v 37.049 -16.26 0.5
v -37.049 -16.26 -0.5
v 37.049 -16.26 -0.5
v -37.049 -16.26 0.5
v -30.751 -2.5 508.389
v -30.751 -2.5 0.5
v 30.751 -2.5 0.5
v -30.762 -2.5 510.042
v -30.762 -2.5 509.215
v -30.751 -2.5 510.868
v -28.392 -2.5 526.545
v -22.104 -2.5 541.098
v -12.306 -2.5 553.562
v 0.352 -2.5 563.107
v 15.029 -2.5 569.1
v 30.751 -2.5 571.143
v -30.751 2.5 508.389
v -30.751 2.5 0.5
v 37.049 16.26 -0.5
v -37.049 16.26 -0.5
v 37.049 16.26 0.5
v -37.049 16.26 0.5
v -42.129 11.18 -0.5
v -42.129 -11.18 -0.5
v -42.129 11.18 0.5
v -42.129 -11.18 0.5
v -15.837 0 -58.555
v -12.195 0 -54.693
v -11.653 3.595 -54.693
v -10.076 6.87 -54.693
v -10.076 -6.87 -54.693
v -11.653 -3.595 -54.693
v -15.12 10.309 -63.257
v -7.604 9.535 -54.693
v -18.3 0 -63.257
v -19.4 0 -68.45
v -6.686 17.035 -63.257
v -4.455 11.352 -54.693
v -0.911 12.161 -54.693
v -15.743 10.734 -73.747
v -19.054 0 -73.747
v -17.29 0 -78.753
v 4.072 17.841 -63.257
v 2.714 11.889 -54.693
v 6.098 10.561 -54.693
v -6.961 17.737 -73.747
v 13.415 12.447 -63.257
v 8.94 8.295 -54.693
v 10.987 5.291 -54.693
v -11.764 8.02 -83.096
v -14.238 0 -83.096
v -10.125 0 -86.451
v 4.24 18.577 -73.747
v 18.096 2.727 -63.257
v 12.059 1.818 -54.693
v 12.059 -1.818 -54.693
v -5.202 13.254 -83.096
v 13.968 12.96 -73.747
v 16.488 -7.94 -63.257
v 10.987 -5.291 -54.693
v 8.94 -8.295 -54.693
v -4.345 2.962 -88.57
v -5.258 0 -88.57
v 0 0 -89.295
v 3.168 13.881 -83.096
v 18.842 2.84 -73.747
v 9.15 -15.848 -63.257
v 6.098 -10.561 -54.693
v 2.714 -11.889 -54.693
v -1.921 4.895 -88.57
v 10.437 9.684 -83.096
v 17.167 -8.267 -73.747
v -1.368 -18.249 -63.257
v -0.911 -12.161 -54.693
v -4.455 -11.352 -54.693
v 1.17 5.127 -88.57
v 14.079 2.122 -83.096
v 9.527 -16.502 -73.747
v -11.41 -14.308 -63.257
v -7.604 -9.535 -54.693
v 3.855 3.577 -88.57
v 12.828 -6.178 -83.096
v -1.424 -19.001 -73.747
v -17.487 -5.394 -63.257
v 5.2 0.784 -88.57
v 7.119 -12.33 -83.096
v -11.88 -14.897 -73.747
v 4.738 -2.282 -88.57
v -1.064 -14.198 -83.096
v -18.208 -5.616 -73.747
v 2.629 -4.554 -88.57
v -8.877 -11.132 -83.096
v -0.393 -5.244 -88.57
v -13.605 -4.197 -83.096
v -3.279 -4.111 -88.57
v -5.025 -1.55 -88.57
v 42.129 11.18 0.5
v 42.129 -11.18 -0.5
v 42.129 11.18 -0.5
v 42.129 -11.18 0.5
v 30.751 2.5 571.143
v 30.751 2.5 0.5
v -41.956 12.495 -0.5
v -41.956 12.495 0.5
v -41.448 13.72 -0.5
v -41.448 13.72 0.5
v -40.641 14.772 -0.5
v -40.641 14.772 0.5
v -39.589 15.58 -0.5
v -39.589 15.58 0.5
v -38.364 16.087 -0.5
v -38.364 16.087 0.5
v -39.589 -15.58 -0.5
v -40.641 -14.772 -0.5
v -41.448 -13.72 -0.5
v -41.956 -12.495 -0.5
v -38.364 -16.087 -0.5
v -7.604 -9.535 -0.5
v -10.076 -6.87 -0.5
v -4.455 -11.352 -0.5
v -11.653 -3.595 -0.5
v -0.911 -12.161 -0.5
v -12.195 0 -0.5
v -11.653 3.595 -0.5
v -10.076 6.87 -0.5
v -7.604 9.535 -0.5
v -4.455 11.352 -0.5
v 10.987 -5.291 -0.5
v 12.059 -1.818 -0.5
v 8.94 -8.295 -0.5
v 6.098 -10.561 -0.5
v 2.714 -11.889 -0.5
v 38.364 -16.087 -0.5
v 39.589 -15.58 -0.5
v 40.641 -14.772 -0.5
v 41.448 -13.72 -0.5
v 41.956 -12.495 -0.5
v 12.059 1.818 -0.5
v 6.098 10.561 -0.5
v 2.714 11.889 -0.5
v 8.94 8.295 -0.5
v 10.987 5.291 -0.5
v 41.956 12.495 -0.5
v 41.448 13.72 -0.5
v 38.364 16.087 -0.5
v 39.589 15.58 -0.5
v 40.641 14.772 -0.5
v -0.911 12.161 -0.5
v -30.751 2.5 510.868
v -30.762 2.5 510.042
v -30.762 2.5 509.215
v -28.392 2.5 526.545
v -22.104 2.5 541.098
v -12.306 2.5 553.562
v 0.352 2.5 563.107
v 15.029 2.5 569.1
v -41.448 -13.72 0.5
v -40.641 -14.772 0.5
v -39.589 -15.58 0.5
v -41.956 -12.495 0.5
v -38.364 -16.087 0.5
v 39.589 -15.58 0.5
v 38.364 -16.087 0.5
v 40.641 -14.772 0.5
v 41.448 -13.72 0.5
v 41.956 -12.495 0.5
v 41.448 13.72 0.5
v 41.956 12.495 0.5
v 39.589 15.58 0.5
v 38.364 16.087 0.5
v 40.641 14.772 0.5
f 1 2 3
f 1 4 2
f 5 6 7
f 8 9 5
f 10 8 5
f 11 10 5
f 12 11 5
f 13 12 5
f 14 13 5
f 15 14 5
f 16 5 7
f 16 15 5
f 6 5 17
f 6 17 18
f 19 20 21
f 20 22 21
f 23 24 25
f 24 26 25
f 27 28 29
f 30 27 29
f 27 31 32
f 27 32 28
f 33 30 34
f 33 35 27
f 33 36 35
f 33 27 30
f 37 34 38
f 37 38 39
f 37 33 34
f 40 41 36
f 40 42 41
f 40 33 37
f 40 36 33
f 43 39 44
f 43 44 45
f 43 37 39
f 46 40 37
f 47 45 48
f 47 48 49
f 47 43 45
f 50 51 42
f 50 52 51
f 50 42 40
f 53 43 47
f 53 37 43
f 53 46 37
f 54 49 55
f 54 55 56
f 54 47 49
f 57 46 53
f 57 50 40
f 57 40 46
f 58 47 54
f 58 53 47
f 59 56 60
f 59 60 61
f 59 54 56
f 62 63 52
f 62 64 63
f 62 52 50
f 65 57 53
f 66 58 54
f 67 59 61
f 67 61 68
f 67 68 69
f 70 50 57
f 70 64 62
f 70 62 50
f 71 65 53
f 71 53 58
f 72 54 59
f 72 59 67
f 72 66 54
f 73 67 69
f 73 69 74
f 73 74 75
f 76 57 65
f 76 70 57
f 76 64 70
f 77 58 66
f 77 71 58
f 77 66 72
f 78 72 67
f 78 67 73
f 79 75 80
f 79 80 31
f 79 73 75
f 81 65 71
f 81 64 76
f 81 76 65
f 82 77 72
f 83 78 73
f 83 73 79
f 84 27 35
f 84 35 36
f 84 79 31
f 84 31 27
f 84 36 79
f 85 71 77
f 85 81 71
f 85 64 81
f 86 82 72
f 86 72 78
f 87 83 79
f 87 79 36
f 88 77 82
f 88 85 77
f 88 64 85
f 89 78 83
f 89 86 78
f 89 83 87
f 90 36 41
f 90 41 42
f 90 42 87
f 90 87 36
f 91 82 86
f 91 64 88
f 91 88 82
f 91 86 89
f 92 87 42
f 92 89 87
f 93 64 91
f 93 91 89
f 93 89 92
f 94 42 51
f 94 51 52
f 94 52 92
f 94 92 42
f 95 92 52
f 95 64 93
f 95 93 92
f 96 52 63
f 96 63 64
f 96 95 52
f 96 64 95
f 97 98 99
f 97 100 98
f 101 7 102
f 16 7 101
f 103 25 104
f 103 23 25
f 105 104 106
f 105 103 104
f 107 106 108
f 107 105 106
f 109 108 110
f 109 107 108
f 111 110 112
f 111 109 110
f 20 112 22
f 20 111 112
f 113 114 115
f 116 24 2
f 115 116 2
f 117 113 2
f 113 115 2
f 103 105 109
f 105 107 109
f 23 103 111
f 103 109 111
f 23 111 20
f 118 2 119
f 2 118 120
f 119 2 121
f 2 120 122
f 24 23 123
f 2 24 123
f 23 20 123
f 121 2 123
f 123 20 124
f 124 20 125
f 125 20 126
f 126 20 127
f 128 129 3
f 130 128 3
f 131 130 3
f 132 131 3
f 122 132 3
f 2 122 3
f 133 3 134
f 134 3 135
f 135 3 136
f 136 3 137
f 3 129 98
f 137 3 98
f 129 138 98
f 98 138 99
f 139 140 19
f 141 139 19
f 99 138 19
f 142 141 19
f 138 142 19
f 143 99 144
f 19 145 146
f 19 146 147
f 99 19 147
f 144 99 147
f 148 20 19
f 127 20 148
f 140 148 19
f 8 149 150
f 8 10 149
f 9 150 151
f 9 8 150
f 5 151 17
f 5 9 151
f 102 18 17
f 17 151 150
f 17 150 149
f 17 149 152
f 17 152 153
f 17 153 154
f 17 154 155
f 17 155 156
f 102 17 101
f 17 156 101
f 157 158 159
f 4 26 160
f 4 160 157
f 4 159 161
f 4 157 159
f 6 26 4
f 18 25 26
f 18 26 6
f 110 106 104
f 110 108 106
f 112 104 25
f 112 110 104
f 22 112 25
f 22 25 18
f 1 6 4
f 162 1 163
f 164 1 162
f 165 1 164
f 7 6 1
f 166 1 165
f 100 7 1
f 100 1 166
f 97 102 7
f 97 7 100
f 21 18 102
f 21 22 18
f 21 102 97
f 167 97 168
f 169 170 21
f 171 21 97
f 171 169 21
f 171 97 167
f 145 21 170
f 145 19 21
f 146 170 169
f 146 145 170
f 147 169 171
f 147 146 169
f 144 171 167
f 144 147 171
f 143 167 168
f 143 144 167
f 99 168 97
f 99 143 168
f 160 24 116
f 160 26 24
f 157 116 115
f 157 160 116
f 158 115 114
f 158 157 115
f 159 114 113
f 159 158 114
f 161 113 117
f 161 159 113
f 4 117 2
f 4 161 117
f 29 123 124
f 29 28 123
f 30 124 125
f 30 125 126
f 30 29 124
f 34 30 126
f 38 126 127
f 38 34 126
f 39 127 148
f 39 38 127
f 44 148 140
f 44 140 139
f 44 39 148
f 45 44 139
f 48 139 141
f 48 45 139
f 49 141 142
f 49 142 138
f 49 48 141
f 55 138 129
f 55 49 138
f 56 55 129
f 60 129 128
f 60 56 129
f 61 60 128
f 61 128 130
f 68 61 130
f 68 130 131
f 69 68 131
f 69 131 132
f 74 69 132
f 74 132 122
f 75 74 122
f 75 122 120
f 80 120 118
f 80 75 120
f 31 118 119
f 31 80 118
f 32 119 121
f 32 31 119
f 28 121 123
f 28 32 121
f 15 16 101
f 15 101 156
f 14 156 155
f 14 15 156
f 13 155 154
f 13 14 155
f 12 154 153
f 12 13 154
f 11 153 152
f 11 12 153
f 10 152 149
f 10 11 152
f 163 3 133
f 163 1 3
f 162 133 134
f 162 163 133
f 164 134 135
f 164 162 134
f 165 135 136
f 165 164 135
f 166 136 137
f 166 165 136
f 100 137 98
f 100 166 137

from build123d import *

# Parameters (mm, degrees)
F0_W     = 84.257484
F0_H     = 32.520414
F1_DEPTH = 0.5
F5_DEPTH = 2.5
F6_R     = 5.08


with BuildPart() as f1:
    # F0 (on Top) → F1 (new body, symmetric)
    with BuildSketch(Plane.XY):
        Rectangle(F0_W, F0_H)
    extrude(amount=F1_DEPTH, both=True)

    # F2 (on Front) → F3 (revolve)
    with BuildSketch(Plane.XZ):
        with BuildLine():
            Line((0, 0), (-12.19517, 0))
            Line((-12.19517, 0), (-12.19517, -54.693431))
            ThreePointArc((-12.19517, -54.693431), (-18.343741, -76.310214), (0, -89.29472))
            Line((0, -89.29472), (0, 0))
        make_face()
    revolve(axis=Axis((0, 0, -44.64736), (0, 0, -1)))

    # F4 (on Front) → F5 (join, symmetric)
    with BuildSketch(Plane.XZ):
        with BuildLine():
            Line((-30.75086, 508.389294), (-30.75086, 0))
            Line((-30.75086, 0), (30.75086, 0))
            Line((30.75086, 0), (30.75086, 571.142793))
            ThreePointArc((30.75086, 571.142793), (-12.305865, 553.561671), (-30.75086, 510.867883))
            Line((-30.75086, 510.867883), (-30.75086, 508.389294))
        make_face()
        with BuildLine():
            ThreePointArc((-30.75086, 510.867883), (-30.763345, 509.628589), (-30.75086, 508.389294))
            Line((-30.75086, 508.389294), (-30.75086, 510.867883))
        make_face()
    extrude(amount=F5_DEPTH, both=True)

    # F6
    f6_edges = [f1.edges().sort_by_distance(p)[0] for p in [
        (-42.128742, -16.260207, 0),
        (-42.128742, 16.260207, 0),
        (42.128742, 16.260207, 0),
        (42.128742, -16.260207, 0),
    ]]
    fillet(f6_edges, radius=F6_R)


solid = f1.part
